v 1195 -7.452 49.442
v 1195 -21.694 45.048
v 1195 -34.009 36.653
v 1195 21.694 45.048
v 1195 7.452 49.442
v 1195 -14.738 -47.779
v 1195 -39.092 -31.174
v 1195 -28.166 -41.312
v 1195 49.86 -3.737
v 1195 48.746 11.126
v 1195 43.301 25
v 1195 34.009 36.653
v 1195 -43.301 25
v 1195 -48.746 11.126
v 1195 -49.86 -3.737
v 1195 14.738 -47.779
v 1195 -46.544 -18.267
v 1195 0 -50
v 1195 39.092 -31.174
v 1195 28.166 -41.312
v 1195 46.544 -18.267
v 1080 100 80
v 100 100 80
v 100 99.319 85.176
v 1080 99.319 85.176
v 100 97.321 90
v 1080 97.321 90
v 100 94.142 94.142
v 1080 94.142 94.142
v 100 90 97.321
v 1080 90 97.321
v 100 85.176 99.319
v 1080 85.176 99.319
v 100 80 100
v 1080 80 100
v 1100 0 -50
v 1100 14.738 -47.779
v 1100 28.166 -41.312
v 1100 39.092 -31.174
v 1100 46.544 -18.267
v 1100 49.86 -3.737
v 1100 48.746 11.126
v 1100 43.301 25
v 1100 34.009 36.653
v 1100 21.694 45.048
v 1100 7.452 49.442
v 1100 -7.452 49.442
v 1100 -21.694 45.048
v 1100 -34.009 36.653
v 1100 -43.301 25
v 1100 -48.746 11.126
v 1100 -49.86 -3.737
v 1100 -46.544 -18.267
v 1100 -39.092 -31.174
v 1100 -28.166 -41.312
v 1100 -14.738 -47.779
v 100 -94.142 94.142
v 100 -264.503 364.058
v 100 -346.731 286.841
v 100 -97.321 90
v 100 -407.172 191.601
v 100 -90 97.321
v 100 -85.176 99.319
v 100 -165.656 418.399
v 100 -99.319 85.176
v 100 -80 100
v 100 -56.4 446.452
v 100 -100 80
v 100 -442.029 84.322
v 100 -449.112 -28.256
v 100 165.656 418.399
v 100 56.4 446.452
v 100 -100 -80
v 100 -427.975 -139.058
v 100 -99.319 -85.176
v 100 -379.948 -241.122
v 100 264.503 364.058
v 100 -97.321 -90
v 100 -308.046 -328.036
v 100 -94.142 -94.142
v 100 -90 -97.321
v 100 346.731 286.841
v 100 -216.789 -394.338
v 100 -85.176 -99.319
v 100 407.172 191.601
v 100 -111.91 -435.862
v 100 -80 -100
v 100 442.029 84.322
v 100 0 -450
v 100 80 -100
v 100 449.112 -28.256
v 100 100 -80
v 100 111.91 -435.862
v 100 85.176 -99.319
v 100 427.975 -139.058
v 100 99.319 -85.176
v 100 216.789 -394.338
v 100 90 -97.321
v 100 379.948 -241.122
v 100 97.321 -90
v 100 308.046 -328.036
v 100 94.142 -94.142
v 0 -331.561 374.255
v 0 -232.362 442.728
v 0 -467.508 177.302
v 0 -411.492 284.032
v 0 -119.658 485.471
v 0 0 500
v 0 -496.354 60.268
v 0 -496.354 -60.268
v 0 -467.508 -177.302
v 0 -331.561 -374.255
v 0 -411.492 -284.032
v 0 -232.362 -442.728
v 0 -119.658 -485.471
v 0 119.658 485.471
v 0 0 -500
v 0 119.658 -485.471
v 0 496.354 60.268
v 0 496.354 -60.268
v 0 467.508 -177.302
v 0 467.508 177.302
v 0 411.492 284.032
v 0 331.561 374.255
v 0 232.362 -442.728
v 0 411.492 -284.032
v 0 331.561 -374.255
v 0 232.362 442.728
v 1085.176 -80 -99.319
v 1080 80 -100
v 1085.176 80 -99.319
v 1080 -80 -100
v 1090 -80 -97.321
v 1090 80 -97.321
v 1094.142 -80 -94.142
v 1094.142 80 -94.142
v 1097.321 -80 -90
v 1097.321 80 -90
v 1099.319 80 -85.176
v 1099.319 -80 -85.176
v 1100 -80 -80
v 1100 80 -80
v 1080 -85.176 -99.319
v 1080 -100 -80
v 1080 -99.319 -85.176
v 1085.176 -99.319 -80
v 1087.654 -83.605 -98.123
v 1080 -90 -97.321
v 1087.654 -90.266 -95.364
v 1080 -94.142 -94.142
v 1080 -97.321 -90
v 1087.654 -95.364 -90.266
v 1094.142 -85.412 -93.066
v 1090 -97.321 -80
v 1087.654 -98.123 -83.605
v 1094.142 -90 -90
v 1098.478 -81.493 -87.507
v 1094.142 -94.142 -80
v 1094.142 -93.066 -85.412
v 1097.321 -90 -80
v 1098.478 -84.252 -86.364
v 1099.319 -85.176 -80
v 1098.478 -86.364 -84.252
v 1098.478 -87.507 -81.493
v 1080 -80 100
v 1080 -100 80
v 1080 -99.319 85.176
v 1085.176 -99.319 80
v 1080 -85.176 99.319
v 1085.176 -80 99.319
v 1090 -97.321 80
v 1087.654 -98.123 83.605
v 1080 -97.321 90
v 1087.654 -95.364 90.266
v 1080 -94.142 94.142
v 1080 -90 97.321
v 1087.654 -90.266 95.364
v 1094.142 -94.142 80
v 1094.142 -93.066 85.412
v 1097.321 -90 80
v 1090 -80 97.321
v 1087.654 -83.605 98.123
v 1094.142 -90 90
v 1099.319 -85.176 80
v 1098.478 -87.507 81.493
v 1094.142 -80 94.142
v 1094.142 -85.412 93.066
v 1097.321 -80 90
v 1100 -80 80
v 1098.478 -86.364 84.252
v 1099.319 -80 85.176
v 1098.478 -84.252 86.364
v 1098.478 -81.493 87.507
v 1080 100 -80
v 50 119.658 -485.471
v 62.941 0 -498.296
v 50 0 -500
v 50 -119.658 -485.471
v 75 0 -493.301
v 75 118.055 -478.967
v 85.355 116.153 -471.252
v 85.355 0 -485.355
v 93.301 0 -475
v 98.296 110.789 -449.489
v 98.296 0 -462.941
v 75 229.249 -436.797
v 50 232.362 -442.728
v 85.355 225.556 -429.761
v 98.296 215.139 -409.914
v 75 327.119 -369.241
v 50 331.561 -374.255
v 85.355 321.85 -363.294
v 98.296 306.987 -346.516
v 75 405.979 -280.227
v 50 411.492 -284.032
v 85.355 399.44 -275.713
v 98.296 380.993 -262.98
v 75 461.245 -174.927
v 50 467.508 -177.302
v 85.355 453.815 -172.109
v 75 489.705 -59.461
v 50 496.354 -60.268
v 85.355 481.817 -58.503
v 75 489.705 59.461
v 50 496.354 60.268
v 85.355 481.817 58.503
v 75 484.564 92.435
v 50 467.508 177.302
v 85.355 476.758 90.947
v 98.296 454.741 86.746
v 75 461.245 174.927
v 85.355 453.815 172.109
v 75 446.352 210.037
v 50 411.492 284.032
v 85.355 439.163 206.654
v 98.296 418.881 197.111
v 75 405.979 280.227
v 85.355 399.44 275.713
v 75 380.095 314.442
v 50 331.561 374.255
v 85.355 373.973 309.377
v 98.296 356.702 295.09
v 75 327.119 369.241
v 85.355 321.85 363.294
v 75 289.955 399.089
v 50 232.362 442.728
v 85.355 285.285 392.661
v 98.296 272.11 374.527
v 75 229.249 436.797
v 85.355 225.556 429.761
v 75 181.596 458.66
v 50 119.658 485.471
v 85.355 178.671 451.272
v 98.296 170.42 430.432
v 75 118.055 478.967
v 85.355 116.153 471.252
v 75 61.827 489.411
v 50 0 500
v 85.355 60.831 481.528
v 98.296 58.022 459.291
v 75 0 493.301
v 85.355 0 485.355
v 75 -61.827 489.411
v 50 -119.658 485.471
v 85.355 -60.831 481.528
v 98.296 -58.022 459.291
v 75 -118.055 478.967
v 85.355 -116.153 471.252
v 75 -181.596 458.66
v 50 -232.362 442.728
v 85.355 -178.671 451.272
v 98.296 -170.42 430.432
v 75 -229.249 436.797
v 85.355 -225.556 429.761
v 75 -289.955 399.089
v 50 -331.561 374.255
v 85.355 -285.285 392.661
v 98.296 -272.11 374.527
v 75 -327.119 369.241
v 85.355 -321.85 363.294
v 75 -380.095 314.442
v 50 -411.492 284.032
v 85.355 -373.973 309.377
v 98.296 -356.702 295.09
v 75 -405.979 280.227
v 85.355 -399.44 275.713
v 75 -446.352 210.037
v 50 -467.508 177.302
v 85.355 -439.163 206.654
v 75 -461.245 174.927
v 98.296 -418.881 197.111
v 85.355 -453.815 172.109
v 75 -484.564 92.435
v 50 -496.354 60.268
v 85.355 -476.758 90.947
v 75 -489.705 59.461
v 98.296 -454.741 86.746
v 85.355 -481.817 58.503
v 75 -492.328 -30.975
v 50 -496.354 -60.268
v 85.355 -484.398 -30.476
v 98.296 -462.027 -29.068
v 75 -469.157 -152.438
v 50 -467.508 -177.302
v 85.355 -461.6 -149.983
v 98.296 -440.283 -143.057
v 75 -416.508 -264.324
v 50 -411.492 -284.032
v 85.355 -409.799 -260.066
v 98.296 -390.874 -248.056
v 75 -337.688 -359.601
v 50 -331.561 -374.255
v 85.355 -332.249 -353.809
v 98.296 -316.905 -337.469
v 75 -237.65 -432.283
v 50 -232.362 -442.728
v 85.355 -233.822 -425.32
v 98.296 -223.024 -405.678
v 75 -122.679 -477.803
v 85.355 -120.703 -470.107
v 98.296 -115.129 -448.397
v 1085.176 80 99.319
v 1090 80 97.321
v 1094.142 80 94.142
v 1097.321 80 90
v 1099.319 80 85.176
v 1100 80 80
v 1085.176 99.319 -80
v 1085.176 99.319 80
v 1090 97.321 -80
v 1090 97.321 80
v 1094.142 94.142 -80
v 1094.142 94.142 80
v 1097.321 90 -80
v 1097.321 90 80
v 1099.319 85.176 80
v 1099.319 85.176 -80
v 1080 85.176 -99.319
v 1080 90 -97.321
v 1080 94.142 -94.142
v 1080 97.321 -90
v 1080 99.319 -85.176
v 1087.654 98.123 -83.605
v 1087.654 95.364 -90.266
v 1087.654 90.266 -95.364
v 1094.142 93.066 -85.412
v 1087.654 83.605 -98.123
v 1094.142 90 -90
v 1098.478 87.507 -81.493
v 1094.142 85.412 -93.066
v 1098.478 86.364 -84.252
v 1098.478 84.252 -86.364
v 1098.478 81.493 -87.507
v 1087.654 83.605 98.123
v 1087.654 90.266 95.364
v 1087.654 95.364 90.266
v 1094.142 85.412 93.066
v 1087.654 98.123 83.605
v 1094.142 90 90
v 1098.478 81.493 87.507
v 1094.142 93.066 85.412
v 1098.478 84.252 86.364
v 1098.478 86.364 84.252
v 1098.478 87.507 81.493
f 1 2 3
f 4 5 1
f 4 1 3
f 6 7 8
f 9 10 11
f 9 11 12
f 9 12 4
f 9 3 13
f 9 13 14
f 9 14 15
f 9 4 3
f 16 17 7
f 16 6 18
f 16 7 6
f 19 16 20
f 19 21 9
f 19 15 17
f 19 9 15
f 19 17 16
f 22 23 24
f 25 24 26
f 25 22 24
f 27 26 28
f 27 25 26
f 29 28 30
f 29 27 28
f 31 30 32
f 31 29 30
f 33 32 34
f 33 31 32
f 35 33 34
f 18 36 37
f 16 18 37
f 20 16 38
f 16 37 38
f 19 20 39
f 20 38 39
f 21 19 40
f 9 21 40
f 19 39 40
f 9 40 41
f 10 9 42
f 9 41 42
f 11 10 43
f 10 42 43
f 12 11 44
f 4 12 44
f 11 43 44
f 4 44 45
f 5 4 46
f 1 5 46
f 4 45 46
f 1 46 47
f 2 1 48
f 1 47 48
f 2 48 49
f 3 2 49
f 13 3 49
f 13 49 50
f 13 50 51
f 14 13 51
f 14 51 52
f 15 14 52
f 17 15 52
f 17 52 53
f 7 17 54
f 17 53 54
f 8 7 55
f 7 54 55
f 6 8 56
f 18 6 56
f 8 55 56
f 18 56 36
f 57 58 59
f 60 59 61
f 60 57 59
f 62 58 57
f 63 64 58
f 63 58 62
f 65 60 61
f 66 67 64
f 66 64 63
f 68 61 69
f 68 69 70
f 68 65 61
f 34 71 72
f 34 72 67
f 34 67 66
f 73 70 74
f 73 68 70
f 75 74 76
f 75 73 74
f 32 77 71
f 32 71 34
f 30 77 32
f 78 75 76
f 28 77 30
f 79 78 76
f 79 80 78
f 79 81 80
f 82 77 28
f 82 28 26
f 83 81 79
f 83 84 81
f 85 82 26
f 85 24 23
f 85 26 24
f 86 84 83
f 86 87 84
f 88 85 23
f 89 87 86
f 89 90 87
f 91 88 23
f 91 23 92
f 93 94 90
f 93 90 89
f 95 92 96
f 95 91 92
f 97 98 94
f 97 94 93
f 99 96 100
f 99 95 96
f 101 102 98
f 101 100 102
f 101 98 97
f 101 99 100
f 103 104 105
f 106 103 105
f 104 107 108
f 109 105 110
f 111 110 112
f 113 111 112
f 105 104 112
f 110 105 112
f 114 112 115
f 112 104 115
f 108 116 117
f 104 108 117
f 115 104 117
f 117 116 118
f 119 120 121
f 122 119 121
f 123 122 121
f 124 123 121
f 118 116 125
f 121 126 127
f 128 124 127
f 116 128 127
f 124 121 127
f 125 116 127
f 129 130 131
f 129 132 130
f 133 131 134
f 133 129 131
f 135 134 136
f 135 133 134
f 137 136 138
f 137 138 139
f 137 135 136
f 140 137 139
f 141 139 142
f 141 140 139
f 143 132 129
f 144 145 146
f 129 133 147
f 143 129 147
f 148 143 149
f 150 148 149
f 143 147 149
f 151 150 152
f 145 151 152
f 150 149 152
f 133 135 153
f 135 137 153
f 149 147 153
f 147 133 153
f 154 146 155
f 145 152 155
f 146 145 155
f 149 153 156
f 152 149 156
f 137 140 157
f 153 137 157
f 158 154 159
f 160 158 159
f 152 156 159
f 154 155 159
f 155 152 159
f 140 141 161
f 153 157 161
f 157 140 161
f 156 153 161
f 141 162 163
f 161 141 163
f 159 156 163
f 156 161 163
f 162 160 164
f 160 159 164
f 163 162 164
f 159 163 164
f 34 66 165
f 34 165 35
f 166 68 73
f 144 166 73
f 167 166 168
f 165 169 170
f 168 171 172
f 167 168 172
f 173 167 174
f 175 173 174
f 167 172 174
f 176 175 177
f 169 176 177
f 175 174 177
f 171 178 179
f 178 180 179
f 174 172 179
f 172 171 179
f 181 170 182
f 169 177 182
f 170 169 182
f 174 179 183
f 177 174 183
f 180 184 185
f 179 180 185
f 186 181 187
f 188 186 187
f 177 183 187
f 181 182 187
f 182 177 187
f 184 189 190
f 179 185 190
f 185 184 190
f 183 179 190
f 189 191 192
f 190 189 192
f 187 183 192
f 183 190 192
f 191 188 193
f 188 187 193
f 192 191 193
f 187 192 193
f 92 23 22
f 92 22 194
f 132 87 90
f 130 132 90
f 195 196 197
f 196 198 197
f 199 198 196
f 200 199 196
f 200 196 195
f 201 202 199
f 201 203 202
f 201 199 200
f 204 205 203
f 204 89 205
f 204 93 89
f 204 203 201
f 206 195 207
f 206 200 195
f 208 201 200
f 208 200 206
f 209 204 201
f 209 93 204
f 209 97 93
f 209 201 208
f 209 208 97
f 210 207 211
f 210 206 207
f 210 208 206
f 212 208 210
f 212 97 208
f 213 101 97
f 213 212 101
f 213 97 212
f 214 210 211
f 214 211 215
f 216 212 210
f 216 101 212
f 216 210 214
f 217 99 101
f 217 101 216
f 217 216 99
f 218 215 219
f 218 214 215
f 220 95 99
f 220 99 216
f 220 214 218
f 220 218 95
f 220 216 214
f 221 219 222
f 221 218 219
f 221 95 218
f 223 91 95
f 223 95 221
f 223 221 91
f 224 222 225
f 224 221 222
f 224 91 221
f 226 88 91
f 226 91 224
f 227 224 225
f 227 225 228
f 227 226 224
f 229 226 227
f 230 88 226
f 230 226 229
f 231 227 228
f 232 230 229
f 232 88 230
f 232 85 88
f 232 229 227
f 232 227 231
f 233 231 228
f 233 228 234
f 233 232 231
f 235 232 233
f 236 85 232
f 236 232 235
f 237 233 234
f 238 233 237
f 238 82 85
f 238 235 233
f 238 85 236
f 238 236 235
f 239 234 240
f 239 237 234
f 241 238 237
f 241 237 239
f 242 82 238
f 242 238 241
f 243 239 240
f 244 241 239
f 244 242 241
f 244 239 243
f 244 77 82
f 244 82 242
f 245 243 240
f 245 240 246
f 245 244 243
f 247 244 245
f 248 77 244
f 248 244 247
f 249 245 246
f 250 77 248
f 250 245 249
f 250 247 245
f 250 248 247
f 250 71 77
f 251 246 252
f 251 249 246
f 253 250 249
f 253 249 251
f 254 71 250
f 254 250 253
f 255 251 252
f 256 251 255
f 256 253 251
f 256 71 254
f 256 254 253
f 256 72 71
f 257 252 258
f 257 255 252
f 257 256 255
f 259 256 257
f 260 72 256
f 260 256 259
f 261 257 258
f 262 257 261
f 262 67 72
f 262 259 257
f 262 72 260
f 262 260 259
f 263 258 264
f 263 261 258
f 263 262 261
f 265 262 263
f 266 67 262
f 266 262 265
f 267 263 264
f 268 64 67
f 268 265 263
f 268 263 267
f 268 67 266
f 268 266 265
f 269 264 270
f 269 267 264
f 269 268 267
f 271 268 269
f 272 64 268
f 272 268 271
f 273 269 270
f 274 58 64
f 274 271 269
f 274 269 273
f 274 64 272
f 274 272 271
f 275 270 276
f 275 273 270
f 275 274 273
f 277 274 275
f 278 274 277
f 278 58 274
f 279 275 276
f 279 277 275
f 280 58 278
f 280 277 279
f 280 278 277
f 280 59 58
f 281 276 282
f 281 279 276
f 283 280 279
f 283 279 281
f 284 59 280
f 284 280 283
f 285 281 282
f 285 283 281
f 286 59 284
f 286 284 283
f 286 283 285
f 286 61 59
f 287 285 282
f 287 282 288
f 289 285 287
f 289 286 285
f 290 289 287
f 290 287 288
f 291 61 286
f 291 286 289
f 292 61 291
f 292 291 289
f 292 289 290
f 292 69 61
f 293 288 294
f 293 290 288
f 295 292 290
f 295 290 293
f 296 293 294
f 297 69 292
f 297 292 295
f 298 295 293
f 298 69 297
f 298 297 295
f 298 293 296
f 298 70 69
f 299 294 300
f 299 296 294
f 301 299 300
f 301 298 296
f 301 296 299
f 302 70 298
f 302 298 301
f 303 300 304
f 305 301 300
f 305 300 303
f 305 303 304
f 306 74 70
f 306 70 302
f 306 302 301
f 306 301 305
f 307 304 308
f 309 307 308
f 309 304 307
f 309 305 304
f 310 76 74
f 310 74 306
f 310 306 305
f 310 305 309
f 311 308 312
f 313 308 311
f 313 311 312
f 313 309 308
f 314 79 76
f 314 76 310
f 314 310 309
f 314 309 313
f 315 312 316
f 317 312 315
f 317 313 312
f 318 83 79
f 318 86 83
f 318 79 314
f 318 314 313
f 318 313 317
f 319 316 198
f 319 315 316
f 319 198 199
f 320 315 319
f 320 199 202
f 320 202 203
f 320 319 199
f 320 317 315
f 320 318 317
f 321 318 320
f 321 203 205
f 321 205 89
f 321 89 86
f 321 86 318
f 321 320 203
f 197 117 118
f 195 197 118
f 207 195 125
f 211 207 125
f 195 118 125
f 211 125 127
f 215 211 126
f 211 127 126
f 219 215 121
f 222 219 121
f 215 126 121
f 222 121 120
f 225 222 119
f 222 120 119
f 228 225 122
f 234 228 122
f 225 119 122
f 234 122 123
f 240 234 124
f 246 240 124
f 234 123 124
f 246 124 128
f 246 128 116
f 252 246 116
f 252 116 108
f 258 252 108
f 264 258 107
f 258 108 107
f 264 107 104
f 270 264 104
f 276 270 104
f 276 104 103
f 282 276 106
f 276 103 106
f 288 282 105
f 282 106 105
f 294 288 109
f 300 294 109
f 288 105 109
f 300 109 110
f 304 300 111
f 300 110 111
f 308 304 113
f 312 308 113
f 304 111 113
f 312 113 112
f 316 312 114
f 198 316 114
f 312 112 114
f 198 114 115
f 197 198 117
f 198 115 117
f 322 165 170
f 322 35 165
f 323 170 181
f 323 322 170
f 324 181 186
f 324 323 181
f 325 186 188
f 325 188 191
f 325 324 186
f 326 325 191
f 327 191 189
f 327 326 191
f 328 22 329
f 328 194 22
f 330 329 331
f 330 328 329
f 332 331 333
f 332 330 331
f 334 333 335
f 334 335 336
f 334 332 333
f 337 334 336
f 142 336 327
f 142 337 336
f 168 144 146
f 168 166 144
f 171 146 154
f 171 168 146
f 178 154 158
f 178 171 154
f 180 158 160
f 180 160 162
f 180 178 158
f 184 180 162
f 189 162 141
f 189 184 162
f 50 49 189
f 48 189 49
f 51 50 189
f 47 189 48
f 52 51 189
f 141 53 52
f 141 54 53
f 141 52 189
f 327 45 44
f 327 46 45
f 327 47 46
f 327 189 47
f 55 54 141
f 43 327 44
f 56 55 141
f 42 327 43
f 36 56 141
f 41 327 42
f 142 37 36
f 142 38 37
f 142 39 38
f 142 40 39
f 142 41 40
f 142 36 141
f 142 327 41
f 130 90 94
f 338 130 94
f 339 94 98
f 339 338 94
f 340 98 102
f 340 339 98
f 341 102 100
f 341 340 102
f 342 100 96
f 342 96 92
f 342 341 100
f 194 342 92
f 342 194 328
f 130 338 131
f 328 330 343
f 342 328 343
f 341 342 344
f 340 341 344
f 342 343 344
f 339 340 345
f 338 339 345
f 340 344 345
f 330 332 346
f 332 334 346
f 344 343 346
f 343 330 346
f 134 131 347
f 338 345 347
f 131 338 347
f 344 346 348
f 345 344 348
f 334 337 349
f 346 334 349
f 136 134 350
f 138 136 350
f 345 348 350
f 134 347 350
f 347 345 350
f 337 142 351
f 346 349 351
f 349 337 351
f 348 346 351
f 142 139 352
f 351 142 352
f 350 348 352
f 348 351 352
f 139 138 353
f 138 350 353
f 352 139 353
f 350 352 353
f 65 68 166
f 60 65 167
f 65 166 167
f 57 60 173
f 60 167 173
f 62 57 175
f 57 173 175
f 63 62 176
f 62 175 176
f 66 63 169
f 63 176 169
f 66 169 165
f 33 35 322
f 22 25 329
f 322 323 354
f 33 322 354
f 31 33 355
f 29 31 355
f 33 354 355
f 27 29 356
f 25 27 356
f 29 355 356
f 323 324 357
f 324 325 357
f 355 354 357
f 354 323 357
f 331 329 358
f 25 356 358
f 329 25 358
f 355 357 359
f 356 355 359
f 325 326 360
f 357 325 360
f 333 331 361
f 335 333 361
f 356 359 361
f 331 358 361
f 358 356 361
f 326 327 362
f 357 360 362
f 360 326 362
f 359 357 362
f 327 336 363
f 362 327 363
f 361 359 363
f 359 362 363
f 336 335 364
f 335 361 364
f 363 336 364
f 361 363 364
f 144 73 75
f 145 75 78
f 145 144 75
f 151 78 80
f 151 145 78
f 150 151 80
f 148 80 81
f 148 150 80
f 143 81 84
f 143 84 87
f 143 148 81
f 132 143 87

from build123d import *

# Parameters (mm, degrees)
ESQUISSE1_R        = 500
BOSS_EXTRU_1_DEPTH = 100
ESQUISSE2_W        = 200
ESQUISSE2_H        = 200
BOSS_EXTRU_2_DEPTH = 1000
ESQUISSE3_R        = 50
BOSS_EXTRU_3_DEPTH = 95
CONG_1_R           = 50
CONG_2_R           = 20
CONG_3_R           = 20


with BuildPart() as part:
    # Esquisse1 → Boss.-Extru.1 (new body)
    with BuildSketch(Plane(origin=(0, 0, 0), x_dir=(0, 0, -1), z_dir=(1, 0, 0))):
        Circle(ESQUISSE1_R)
    extrude(amount=BOSS_EXTRU_1_DEPTH)

    # Esquisse2 → Boss.-Extru.2 (add)
    with BuildSketch(Plane(origin=(100, 0, 0), x_dir=(0, 0, -1), z_dir=(1, 0, 0))):
        Rectangle(ESQUISSE2_W, ESQUISSE2_H)
    extrude(amount=BOSS_EXTRU_2_DEPTH)

    # Esquisse3 → Boss.-Extru.3 (add)
    with BuildSketch(Plane(origin=(1100, 0, 0), x_dir=(0, 0, -1), z_dir=(1, 0, 0))):
        Circle(ESQUISSE3_R)
    extrude(amount=BOSS_EXTRU_3_DEPTH)

    # Congé1
    cong_1_edges = [part.edges().sort_by_distance(p)[0] for p in [
        (100, 0, 500),
    ]]
    fillet(cong_1_edges, radius=CONG_1_R)

    # Congé2
    cong_2_edges = [part.edges().sort_by_distance(p)[0] for p in [
        (600, -100, -100),
        (600, 100, -100),
        (600, 100, 100),
        (600, -100, 100),
    ]]
    fillet(cong_2_edges, radius=CONG_2_R)

    # Congé3
    cong_3_edges = [part.edges().sort_by_distance(p)[0] for p in [
        (1100, 100, 0),
        (1100, 0, -100),
        (1100, 0, 100),
        (1100, -100, 0),
        (1100, 94.142135624, 94.142135624),
        (1100, -94.142135624, 94.142135624),
        (1100, -94.142135624, -94.142135624),
        (1100, 94.142135624, -94.142135624),
    ]]
    fillet(cong_3_edges, radius=CONG_3_R)


solid = part.part
